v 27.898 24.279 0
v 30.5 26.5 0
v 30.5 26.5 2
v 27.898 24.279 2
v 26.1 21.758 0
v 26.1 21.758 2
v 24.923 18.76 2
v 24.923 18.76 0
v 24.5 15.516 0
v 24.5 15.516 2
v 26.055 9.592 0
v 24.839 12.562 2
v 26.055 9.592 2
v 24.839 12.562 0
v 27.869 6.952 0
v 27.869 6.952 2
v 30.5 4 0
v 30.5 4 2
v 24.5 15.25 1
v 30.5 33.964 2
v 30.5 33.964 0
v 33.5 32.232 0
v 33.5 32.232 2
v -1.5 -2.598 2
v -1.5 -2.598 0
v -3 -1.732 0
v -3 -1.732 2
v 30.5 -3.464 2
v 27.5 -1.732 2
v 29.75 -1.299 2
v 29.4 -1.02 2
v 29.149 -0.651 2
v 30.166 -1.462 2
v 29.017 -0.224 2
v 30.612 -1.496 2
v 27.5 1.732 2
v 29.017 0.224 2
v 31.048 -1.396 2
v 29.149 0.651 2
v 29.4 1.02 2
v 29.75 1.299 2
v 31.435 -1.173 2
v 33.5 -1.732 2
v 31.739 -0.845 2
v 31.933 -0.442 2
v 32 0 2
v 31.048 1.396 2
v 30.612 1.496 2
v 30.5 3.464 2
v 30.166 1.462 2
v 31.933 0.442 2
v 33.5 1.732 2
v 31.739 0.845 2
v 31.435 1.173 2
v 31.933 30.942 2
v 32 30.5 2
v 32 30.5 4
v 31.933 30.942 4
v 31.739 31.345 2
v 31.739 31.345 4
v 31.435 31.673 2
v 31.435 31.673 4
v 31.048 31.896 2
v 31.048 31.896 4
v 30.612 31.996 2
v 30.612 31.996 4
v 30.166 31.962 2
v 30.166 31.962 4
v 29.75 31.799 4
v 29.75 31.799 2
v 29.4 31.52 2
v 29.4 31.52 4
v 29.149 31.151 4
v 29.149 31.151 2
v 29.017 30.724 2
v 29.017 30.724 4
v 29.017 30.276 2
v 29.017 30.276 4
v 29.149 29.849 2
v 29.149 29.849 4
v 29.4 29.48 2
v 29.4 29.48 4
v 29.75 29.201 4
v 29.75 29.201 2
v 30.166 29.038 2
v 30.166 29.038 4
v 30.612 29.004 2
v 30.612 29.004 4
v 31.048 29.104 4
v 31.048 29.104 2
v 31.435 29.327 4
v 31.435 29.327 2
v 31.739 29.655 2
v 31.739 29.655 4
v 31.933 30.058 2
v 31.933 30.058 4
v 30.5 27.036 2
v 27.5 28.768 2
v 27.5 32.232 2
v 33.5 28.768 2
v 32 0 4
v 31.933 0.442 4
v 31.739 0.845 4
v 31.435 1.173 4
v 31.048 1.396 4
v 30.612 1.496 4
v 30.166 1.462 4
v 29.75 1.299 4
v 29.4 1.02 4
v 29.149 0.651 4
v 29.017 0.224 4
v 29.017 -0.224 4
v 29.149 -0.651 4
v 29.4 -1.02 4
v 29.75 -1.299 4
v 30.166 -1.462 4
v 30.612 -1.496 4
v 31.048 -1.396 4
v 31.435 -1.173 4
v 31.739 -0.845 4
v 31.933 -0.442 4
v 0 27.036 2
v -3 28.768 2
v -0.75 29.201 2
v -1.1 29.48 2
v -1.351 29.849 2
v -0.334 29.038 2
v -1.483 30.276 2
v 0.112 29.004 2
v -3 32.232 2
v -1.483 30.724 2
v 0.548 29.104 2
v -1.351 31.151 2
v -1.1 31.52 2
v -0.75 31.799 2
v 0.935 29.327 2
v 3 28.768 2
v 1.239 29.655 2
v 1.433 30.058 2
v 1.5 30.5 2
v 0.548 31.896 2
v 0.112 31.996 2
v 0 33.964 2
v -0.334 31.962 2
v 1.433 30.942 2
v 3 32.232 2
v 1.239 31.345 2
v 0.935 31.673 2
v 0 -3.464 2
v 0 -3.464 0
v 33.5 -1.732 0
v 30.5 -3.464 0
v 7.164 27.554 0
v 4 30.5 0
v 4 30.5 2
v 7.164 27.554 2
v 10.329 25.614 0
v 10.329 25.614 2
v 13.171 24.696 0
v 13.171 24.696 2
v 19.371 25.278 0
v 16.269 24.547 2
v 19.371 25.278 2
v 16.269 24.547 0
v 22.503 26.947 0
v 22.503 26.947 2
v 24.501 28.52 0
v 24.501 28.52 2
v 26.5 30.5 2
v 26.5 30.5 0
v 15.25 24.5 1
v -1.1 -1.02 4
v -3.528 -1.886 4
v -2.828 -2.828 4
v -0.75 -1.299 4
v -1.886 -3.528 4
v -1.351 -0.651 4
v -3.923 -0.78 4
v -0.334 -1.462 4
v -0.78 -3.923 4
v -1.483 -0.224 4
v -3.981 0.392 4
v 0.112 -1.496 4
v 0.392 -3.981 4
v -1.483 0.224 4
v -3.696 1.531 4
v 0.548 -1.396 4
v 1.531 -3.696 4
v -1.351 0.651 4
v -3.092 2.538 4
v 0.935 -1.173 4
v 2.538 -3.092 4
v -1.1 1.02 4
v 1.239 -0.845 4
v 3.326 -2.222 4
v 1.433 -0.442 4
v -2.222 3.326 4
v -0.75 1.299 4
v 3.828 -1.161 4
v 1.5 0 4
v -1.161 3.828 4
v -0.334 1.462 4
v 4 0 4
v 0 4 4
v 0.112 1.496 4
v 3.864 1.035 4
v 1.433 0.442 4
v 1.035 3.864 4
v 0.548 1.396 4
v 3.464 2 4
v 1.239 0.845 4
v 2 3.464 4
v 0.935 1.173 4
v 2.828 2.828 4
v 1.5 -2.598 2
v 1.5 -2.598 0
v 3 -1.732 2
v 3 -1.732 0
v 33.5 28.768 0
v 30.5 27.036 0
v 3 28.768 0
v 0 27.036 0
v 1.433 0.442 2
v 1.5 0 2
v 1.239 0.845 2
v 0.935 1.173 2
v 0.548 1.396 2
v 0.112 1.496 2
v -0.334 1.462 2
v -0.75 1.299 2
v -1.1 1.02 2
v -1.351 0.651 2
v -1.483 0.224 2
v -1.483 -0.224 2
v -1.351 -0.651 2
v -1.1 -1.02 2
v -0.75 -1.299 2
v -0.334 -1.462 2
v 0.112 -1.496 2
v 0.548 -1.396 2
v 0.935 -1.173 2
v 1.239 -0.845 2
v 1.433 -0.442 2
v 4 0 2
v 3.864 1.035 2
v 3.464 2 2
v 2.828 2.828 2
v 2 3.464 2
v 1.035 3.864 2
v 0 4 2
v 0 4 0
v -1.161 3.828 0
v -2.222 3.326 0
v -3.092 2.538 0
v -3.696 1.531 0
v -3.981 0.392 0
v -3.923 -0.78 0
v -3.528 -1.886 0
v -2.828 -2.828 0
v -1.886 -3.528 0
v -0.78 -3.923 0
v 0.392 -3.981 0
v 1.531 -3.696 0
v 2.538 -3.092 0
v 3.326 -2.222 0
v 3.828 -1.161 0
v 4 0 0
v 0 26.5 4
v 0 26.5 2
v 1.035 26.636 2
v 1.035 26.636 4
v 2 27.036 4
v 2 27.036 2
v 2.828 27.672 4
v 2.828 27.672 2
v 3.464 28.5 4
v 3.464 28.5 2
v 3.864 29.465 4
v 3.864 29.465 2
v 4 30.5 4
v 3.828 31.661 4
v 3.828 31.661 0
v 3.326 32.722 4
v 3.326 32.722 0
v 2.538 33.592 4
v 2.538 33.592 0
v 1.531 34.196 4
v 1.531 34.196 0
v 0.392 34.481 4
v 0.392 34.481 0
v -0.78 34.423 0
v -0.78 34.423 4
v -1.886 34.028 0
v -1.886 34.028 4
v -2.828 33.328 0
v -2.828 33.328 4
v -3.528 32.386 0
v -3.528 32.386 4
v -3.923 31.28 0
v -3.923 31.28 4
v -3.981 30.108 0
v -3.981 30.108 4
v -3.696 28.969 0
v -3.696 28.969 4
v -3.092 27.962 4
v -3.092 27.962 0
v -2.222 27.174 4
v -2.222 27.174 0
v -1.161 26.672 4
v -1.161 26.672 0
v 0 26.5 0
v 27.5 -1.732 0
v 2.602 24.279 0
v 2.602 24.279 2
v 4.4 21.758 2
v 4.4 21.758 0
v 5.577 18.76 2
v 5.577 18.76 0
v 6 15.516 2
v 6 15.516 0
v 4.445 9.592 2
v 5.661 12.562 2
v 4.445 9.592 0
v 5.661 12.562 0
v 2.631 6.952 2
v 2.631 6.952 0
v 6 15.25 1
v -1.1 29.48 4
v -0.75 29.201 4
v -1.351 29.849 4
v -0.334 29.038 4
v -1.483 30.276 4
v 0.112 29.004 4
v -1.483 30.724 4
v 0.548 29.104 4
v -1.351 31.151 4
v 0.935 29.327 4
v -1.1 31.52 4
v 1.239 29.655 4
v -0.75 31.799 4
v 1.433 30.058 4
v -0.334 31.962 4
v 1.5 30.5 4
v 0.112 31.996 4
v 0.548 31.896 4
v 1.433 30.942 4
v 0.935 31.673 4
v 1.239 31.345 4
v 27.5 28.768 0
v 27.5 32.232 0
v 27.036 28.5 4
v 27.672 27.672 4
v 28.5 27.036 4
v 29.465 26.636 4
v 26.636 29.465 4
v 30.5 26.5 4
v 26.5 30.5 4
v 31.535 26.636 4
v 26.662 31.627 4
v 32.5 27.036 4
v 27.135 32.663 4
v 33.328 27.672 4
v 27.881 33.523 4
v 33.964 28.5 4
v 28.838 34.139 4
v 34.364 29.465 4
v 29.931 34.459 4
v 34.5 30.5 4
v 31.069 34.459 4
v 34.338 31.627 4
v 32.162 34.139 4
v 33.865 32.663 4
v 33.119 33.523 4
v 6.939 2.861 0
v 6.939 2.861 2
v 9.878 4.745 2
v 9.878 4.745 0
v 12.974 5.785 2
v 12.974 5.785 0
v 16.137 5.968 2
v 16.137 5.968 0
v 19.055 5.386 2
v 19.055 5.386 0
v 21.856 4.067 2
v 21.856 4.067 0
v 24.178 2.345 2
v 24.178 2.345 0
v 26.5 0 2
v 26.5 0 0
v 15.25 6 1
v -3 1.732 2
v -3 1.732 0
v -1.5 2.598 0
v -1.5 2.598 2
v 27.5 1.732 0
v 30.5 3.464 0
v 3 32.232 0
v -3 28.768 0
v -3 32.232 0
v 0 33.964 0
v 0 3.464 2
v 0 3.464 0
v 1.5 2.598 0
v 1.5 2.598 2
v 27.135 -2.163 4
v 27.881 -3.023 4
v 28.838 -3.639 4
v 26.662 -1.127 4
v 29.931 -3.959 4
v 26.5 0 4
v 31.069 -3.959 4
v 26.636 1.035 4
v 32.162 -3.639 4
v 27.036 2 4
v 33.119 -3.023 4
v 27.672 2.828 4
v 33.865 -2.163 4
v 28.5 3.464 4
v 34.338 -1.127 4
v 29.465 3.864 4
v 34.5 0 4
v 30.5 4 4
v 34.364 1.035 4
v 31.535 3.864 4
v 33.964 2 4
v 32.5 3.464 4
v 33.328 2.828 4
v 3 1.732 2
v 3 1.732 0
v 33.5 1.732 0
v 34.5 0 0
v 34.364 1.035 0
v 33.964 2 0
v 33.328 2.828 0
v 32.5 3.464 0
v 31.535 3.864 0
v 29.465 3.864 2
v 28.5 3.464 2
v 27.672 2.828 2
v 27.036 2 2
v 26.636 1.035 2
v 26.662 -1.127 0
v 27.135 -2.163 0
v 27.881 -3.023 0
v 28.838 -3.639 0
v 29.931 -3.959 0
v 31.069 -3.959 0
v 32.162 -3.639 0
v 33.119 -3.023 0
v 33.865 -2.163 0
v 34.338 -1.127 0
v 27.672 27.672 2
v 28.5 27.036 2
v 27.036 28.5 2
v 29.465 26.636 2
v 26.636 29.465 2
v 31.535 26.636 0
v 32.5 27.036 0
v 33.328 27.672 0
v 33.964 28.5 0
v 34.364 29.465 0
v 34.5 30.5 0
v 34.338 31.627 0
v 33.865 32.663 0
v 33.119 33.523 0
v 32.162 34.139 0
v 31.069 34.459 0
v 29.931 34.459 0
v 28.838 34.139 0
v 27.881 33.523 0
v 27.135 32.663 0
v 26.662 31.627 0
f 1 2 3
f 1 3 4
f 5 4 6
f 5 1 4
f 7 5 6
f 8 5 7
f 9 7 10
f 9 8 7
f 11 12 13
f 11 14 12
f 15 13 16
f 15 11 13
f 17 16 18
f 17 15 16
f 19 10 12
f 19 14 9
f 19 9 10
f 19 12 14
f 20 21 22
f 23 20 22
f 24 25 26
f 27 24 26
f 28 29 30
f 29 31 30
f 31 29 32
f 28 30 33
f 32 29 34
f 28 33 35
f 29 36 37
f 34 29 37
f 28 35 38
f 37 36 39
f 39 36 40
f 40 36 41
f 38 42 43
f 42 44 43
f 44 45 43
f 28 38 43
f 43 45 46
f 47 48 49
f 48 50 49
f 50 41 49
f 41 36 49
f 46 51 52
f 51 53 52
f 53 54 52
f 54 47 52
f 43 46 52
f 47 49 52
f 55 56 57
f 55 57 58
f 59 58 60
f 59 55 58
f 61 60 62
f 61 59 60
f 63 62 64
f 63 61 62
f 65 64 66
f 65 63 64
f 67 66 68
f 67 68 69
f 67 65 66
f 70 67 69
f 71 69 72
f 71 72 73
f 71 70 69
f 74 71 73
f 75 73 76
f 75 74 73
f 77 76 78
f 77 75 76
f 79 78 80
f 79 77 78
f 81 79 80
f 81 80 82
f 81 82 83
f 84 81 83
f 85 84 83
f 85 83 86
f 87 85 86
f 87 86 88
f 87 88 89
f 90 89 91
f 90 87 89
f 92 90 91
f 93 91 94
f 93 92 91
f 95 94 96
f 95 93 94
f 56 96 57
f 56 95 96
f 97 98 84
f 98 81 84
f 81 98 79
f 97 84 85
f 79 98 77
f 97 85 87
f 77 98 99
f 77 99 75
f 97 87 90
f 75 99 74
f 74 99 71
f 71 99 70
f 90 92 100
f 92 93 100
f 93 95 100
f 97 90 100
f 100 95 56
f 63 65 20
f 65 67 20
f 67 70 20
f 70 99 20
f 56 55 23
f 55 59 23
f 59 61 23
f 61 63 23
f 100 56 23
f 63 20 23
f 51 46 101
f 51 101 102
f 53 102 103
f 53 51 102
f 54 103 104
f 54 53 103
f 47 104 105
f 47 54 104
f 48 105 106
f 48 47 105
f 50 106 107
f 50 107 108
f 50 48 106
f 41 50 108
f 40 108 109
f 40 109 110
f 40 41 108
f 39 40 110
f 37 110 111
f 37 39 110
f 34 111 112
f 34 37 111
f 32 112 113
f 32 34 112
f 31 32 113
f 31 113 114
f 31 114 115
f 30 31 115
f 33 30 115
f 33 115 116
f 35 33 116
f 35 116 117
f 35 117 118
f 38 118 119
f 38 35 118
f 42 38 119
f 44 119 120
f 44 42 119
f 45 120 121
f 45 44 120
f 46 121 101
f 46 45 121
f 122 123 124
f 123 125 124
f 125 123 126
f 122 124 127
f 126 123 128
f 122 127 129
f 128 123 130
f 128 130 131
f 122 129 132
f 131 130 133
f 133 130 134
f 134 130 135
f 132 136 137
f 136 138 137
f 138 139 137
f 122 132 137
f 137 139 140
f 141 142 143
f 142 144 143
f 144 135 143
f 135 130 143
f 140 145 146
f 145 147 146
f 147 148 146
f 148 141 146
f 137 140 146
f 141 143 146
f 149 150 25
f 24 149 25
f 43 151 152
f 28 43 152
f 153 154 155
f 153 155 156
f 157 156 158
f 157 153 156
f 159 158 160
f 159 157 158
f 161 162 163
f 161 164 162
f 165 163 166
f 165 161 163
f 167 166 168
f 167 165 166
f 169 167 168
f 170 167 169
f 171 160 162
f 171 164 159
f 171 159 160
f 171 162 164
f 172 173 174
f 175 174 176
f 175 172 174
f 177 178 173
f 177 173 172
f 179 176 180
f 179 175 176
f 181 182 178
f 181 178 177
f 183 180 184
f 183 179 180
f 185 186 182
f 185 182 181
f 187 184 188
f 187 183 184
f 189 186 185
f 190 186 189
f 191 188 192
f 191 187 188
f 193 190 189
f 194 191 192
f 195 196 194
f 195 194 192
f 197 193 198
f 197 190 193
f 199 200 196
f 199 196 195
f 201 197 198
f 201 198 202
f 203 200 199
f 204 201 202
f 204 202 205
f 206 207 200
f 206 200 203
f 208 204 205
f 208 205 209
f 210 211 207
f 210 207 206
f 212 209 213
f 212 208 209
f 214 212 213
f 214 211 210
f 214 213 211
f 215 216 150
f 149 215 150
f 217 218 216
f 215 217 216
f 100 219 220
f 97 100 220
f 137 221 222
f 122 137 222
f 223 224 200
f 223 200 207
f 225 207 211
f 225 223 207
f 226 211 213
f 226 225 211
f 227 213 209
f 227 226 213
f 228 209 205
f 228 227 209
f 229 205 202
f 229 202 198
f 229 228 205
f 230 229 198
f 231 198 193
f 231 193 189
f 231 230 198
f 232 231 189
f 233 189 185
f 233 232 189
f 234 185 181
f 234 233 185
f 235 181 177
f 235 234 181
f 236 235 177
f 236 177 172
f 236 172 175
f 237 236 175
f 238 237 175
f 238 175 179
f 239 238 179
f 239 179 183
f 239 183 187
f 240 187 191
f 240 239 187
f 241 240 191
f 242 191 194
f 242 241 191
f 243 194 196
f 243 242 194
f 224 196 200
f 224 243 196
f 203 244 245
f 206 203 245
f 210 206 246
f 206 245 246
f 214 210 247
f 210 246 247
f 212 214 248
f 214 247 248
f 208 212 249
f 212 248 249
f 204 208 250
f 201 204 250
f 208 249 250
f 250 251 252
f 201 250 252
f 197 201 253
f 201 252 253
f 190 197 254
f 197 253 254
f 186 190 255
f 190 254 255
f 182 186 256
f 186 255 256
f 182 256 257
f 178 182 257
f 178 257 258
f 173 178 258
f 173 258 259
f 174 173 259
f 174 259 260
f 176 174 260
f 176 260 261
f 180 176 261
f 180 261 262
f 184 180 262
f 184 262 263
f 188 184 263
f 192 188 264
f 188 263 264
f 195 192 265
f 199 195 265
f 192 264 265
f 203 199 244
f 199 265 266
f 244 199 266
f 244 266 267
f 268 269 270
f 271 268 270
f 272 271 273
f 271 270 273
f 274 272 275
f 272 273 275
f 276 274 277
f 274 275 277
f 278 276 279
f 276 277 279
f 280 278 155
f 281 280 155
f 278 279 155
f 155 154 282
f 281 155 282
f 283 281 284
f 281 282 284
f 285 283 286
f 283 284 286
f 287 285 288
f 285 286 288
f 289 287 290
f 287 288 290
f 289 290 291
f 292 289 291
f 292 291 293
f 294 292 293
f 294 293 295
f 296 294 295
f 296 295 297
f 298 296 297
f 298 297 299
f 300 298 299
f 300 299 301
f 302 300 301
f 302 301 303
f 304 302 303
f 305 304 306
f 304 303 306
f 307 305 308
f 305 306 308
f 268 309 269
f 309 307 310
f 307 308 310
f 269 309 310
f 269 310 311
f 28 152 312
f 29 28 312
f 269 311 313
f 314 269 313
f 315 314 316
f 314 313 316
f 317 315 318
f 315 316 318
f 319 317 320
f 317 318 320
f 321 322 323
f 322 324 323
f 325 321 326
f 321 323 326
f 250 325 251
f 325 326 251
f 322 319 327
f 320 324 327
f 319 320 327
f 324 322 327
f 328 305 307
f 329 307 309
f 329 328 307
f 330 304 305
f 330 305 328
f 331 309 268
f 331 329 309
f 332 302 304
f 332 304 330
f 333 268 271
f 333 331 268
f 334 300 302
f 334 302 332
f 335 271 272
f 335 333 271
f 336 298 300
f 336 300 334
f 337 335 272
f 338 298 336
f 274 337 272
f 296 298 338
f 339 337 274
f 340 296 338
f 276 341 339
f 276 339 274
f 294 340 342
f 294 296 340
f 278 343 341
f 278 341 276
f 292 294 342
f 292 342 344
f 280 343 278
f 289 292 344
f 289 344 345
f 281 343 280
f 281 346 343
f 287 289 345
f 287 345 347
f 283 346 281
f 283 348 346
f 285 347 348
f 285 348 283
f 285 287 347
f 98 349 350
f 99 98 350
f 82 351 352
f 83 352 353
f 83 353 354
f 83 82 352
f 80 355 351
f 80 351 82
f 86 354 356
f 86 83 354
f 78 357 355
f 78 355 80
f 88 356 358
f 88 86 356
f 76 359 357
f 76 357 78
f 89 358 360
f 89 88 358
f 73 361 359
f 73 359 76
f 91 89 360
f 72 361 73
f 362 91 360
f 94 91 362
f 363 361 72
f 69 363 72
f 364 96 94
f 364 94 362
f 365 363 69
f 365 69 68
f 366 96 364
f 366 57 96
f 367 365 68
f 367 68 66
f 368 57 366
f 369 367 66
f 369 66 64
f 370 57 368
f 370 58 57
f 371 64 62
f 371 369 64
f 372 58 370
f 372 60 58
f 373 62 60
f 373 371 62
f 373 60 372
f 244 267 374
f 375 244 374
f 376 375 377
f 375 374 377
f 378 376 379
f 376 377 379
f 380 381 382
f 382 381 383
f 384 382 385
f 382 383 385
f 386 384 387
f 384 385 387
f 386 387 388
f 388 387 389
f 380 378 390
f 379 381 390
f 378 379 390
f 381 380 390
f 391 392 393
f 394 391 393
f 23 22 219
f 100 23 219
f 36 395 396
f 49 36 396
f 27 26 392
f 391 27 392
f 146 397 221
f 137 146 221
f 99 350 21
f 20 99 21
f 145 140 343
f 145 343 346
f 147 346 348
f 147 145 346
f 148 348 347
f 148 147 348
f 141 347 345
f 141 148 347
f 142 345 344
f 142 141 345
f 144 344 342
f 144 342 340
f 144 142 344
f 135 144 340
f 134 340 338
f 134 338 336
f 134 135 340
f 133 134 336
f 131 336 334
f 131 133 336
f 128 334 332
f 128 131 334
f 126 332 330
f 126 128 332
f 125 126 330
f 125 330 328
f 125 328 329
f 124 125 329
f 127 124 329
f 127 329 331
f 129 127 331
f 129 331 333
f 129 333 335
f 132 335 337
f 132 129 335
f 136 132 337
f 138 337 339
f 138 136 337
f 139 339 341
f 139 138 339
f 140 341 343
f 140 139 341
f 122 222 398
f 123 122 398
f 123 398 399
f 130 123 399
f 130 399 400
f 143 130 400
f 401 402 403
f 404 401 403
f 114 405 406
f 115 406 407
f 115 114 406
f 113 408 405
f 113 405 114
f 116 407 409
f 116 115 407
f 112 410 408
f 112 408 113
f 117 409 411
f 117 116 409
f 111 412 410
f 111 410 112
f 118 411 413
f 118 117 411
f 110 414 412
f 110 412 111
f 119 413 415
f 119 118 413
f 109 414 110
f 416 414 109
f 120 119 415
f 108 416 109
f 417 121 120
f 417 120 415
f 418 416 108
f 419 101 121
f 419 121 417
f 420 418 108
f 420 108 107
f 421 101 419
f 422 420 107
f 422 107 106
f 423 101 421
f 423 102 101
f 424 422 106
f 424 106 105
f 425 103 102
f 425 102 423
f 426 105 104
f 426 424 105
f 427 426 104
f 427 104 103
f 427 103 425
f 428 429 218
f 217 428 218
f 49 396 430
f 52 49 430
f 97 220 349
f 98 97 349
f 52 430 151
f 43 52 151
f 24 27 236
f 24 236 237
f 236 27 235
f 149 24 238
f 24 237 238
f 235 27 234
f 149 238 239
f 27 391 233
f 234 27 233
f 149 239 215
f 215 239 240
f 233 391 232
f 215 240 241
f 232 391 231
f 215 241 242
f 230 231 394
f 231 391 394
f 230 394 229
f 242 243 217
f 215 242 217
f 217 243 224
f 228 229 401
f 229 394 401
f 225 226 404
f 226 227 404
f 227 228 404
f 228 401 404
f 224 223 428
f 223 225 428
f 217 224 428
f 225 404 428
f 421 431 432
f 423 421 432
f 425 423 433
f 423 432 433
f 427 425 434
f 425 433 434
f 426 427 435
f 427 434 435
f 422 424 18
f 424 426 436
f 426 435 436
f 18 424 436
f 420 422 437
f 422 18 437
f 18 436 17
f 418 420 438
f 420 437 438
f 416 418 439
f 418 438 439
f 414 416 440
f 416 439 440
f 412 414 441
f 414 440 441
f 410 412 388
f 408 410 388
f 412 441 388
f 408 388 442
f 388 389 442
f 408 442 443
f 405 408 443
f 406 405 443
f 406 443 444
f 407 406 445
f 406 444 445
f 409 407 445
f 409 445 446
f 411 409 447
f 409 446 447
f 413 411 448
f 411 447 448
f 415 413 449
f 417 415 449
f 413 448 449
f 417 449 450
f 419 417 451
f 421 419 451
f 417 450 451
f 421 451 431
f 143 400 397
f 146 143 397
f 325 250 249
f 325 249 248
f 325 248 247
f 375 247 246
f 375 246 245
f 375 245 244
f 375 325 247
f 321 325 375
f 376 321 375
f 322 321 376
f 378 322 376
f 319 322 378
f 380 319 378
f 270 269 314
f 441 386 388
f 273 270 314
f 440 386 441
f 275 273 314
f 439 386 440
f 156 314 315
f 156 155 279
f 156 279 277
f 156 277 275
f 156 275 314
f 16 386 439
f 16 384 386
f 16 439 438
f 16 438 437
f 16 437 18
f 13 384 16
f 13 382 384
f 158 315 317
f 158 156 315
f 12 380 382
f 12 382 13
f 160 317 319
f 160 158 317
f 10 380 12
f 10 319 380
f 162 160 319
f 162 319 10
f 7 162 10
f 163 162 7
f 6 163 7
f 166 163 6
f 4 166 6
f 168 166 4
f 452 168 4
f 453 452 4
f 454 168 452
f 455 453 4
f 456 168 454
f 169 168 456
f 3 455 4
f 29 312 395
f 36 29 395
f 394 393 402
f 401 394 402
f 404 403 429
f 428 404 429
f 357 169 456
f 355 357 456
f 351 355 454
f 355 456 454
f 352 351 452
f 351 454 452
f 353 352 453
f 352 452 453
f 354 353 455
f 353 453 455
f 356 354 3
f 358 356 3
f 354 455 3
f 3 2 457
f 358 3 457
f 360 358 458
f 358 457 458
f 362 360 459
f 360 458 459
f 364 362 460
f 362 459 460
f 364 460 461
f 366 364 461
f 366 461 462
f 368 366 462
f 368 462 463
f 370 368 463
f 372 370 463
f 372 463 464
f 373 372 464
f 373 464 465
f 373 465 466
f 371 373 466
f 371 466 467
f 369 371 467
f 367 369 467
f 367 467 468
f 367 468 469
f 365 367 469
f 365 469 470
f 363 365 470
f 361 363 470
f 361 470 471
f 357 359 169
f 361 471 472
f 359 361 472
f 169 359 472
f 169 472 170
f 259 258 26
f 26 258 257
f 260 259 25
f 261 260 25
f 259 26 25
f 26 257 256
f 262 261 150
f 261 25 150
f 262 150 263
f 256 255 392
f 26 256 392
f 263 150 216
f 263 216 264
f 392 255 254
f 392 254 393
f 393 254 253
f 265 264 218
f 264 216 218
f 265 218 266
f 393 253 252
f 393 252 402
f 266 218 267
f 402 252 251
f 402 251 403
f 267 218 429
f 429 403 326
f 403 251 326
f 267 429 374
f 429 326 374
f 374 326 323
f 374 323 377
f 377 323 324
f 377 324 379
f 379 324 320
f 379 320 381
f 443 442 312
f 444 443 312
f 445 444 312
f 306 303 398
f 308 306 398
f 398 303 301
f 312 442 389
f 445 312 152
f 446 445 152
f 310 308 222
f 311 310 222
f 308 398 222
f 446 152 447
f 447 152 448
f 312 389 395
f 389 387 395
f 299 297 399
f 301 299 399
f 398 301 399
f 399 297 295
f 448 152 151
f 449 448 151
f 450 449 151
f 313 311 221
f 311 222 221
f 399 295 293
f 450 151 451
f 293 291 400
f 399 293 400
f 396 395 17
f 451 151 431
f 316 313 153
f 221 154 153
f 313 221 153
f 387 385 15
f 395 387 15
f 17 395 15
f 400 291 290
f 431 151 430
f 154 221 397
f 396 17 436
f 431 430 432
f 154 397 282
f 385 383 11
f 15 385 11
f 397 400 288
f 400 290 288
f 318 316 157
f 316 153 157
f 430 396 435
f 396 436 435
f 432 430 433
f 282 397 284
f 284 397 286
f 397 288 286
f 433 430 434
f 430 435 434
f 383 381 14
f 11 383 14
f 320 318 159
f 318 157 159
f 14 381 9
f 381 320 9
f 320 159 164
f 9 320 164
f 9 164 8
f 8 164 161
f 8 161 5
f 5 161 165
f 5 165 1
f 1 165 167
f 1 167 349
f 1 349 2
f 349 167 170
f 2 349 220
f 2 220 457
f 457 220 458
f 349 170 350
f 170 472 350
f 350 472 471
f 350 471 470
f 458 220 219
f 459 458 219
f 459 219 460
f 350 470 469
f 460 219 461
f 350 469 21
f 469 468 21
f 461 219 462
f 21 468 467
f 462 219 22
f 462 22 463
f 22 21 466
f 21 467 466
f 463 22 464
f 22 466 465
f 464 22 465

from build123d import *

# Parameters (mm, degrees)
F1_DEPTH = 2
F2_DEPTH = 4
F3_START = 2
F0_R     = 1.5
F3_DEPTH = 2


with BuildPart() as f1:
    # F0 (on Top) → F1 (new body)
    with BuildSketch(Plane.XY):
        with BuildLine():
            ThreePointArc((0, 4), (-2.8284271247, -2.8284271247), (4, 0))
            ThreePointArc((4, 0), (2.8284271247, 2.8284271247), (0, 4))
        make_face()
        Polygon((3, 1.7320508076), (3, 0), (3, -1.7320508076), (1.4999999564, -2.5980762365), (0, -3.4641016151), (-1.4999999973, -2.5980762129), (-3, -1.7320508076), (-3, 0), (-3, 1.7320508076), (-1.4999999564, 2.5980762365), (0, 3.4641016151), (1.4999999564, 2.5980762365), align=None, mode=Mode.SUBTRACT)
        with BuildLine():
            ThreePointArc((0, 4), (2.8284271247, 2.8284271247), (4, 0))
            add(Edge.make_bspline(
                [(4, 0), (7.75, 4.317717161), (15.25, 7.682282839), (22.75, 4.317717161), (26.5, 0)],
                knots=[0, 0, 0, 0, 0.5, 1, 1, 1, 1], degree=3))
            ThreePointArc((26.5, 0), (27.6715728753, 2.8284271247), (30.5, 4))
            add(Edge.make_bspline(
                [(30.5, 26.5), (25.9933560661, 23.4998809866), (22.921031967, 14.5143643781), (26.1645799999, 8.4713902573), (30.5, 4)],
                knots=[0, 0, 0, 0, 0.5, 1, 1, 1, 1], degree=3))
            ThreePointArc((30.5, 26.5), (27.6715728753, 27.6715728753), (26.5, 30.5))
            add(Edge.make_bspline(
                [(15.25, 24.5), (19, 24.5), (22.75, 26.3951093107), (26.5, 30.5)],
                knots=[0.5, 0.5, 0.5, 0.5, 1, 1, 1, 1], degree=3))
            add(Edge.make_bspline(
                [(4, 30.5), (7.75, 26.3951093107), (11.5, 24.5), (15.25, 24.5)],
                knots=[0, 0, 0, 0, 0.5, 0.5, 0.5, 0.5], degree=3))
            ThreePointArc((4, 30.5), (2.8284271247, 27.6715728753), (0, 26.5))
            add(Edge.make_bspline(
                [(0, 26.5), (4.5066439339, 23.4998809866), (7.578968033, 14.5143643781), (4.3354200001, 8.4713902573), (0, 4)],
                knots=[0, 0, 0, 0, 0.5, 1, 1, 1, 1], degree=3))
        make_face()
        with BuildLine():
            ThreePointArc((30.5, 4), (27.6715728753, 2.8284271247), (26.5, 0))
            ThreePointArc((26.5, 0), (30.5, -4), (34.5, 0))
            ThreePointArc((34.5, 0), (33.3284271247, 2.8284271247), (30.5, 4))
        make_face()
        Polygon((27.5, 1.7320508076), (30.5, 3.4641016151), (33.5, 1.7320508076), (33.5, -1.7320508076), (30.5, -3.4641016151), (27.5, -1.7320508076), align=None, mode=Mode.SUBTRACT)
        with BuildLine():
            ThreePointArc((4, 30.5), (-2.8284271247, 33.3284271247), (0, 26.5))
            ThreePointArc((0, 26.5), (2.8284271247, 27.6715728753), (4, 30.5))
        make_face()
        Polygon((-3, 32.2320508076), (0, 33.9641016151), (3, 32.2320508076), (3, 28.7679491924), (0, 27.0358983849), (-3, 28.7679491924), align=None, mode=Mode.SUBTRACT)
        with BuildLine():
            ThreePointArc((26.5, 30.5), (27.6715728753, 27.6715728753), (30.5, 26.5))
            ThreePointArc((30.5, 26.5), (33.3284271247, 27.6715728753), (34.5, 30.5))
            ThreePointArc((34.5, 30.5), (30.5, 34.5), (26.5, 30.5))
        make_face()
        Polygon((27.5, 32.2320508076), (30.5, 33.9641016151), (33.5, 32.2320508076), (33.5, 28.7679491924), (30.5, 27.0358983849), (27.5, 28.7679491924), align=None, mode=Mode.SUBTRACT)
    extrude(amount=F1_DEPTH)

    # F0 (on Top) → F2 (join)
    with BuildSketch(Plane.XY):
        with BuildLine():
            ThreePointArc((4, 30.5), (-2.8284271247, 33.3284271247), (0, 26.5))
            ThreePointArc((0, 26.5), (2.8284271247, 27.6715728753), (4, 30.5))
        make_face()
        Polygon((-3, 32.2320508076), (0, 33.9641016151), (3, 32.2320508076), (3, 28.7679491924), (0, 27.0358983849), (-3, 28.7679491924), align=None, mode=Mode.SUBTRACT)
        with BuildLine():
            ThreePointArc((26.5, 30.5), (27.6715728753, 27.6715728753), (30.5, 26.5))
            ThreePointArc((30.5, 26.5), (33.3284271247, 27.6715728753), (34.5, 30.5))
            ThreePointArc((34.5, 30.5), (30.5, 34.5), (26.5, 30.5))
        make_face()
        Polygon((27.5, 32.2320508076), (30.5, 33.9641016151), (33.5, 32.2320508076), (33.5, 28.7679491924), (30.5, 27.0358983849), (27.5, 28.7679491924), align=None, mode=Mode.SUBTRACT)
        with BuildLine():
            ThreePointArc((30.5, 4), (27.6715728753, 2.8284271247), (26.5, 0))
            ThreePointArc((26.5, 0), (30.5, -4), (34.5, 0))
            ThreePointArc((34.5, 0), (33.3284271247, 2.8284271247), (30.5, 4))
        make_face()
        Polygon((27.5, 1.7320508076), (30.5, 3.4641016151), (33.5, 1.7320508076), (33.5, -1.7320508076), (30.5, -3.4641016151), (27.5, -1.7320508076), align=None, mode=Mode.SUBTRACT)
        with BuildLine():
            ThreePointArc((0, 4), (-2.8284271247, -2.8284271247), (4, 0))
            ThreePointArc((4, 0), (2.8284271247, 2.8284271247), (0, 4))
        make_face()
        Polygon((3, 1.7320508076), (3, 0), (3, -1.7320508076), (1.4999999564, -2.5980762365), (0, -3.4641016151), (-1.4999999973, -2.5980762129), (-3, -1.7320508076), (-3, 0), (-3, 1.7320508076), (-1.4999999564, 2.5980762365), (0, 3.4641016151), (1.4999999564, 2.5980762365), align=None, mode=Mode.SUBTRACT)
    extrude(amount=F2_DEPTH)

    # F0 (on Top) → F3 (join)
    with BuildSketch(Plane.XY.offset(F3_START)):
        with BuildLine():
            ThreePointArc((1.4999999564, -2.5980762365), (2.5980761988, -1.5000000218), (3, 0))
            ThreePointArc((3, 0), (2.5980761988, 1.5000000218), (1.4999999564, 2.5980762365))
            ThreePointArc((1.4999999564, 2.5980762365), (0, 3), (-1.4999999564, 2.5980762365))
            ThreePointArc((-1.4999999564, 2.5980762365), (-2.5980761988, 1.5000000218), (-3, 0))
            ThreePointArc((-3, 0), (-2.5980762106, -1.5000000014), (-1.4999999973, -2.5980762129))
            ThreePointArc((-1.4999999973, -2.5980762129), (-2.36e-08, -3), (1.4999999564, -2.5980762365))
        make_face()
        Circle(F0_R, mode=Mode.SUBTRACT)
        with BuildLine():
            ThreePointArc((-3, 0), (-2.5980761988, 1.5000000218), (-1.4999999564, 2.5980762365))
            Line((-1.4999999564, 2.5980762365), (-3, 1.7320508076))
            Line((-3, 1.7320508076), (-3, 0))
        make_face()
        with BuildLine():
            ThreePointArc((1.4999999564, 2.5980762365), (2.5980761988, 1.5000000218), (3, 0))
            Line((3, 0), (3, 1.7320508076))
            Line((3, 1.7320508076), (1.4999999564, 2.5980762365))
        make_face()
        with BuildLine():
            Line((3, -1.7320508076), (3, 0))
            ThreePointArc((3, 0), (2.5980761988, -1.5000000218), (1.4999999564, -2.5980762365))
            Line((1.4999999564, -2.5980762365), (3, -1.7320508076))
        make_face()
        with BuildLine():
            Line((-3, -1.7320508076), (-1.4999999973, -2.5980762129))
            ThreePointArc((-1.4999999973, -2.5980762129), (-2.5980762106, -1.5000000014), (-3, 0))
            Line((-3, 0), (-3, -1.7320508076))
        make_face()
        with BuildLine():
            ThreePointArc((-1.4999999564, 2.5980762365), (0, 3), (1.4999999564, 2.5980762365))
            Line((1.4999999564, 2.5980762365), (0, 3.4641016151))
            Line((0, 3.4641016151), (-1.4999999564, 2.5980762365))
        make_face()
        with BuildLine():
            Line((0, -3.4641016151), (1.4999999564, -2.5980762365))
            ThreePointArc((1.4999999564, -2.5980762365), (-2.36e-08, -3), (-1.4999999973, -2.5980762129))
            Line((-1.4999999973, -2.5980762129), (0, -3.4641016151))
        make_face()
        Polygon((33.5, 1.7320508076), (30.5, 3.4641016151), (27.5, 1.7320508076), (27.5, -1.7320508076), (30.5, -3.4641016151), (33.5, -1.7320508076), align=None)
        with Locations((30.5, 0)):
            Circle(F0_R, mode=Mode.SUBTRACT)
        Polygon((33.5, 32.2320508076), (30.5, 33.9641016151), (27.5, 32.2320508076), (27.5, 28.7679491924), (30.5, 27.0358983849), (33.5, 28.7679491924), align=None)
        with Locations((30.5, 30.5)):
            Circle(F0_R, mode=Mode.SUBTRACT)
        Polygon((3, 32.2320508076), (0, 33.9641016151), (-3, 32.2320508076), (-3, 28.7679491924), (0, 27.0358983849), (3, 28.7679491924), align=None)
        with Locations((0, 30.5)):
            Circle(F0_R, mode=Mode.SUBTRACT)
    extrude(amount=F3_DEPTH)


solid = f1.part
